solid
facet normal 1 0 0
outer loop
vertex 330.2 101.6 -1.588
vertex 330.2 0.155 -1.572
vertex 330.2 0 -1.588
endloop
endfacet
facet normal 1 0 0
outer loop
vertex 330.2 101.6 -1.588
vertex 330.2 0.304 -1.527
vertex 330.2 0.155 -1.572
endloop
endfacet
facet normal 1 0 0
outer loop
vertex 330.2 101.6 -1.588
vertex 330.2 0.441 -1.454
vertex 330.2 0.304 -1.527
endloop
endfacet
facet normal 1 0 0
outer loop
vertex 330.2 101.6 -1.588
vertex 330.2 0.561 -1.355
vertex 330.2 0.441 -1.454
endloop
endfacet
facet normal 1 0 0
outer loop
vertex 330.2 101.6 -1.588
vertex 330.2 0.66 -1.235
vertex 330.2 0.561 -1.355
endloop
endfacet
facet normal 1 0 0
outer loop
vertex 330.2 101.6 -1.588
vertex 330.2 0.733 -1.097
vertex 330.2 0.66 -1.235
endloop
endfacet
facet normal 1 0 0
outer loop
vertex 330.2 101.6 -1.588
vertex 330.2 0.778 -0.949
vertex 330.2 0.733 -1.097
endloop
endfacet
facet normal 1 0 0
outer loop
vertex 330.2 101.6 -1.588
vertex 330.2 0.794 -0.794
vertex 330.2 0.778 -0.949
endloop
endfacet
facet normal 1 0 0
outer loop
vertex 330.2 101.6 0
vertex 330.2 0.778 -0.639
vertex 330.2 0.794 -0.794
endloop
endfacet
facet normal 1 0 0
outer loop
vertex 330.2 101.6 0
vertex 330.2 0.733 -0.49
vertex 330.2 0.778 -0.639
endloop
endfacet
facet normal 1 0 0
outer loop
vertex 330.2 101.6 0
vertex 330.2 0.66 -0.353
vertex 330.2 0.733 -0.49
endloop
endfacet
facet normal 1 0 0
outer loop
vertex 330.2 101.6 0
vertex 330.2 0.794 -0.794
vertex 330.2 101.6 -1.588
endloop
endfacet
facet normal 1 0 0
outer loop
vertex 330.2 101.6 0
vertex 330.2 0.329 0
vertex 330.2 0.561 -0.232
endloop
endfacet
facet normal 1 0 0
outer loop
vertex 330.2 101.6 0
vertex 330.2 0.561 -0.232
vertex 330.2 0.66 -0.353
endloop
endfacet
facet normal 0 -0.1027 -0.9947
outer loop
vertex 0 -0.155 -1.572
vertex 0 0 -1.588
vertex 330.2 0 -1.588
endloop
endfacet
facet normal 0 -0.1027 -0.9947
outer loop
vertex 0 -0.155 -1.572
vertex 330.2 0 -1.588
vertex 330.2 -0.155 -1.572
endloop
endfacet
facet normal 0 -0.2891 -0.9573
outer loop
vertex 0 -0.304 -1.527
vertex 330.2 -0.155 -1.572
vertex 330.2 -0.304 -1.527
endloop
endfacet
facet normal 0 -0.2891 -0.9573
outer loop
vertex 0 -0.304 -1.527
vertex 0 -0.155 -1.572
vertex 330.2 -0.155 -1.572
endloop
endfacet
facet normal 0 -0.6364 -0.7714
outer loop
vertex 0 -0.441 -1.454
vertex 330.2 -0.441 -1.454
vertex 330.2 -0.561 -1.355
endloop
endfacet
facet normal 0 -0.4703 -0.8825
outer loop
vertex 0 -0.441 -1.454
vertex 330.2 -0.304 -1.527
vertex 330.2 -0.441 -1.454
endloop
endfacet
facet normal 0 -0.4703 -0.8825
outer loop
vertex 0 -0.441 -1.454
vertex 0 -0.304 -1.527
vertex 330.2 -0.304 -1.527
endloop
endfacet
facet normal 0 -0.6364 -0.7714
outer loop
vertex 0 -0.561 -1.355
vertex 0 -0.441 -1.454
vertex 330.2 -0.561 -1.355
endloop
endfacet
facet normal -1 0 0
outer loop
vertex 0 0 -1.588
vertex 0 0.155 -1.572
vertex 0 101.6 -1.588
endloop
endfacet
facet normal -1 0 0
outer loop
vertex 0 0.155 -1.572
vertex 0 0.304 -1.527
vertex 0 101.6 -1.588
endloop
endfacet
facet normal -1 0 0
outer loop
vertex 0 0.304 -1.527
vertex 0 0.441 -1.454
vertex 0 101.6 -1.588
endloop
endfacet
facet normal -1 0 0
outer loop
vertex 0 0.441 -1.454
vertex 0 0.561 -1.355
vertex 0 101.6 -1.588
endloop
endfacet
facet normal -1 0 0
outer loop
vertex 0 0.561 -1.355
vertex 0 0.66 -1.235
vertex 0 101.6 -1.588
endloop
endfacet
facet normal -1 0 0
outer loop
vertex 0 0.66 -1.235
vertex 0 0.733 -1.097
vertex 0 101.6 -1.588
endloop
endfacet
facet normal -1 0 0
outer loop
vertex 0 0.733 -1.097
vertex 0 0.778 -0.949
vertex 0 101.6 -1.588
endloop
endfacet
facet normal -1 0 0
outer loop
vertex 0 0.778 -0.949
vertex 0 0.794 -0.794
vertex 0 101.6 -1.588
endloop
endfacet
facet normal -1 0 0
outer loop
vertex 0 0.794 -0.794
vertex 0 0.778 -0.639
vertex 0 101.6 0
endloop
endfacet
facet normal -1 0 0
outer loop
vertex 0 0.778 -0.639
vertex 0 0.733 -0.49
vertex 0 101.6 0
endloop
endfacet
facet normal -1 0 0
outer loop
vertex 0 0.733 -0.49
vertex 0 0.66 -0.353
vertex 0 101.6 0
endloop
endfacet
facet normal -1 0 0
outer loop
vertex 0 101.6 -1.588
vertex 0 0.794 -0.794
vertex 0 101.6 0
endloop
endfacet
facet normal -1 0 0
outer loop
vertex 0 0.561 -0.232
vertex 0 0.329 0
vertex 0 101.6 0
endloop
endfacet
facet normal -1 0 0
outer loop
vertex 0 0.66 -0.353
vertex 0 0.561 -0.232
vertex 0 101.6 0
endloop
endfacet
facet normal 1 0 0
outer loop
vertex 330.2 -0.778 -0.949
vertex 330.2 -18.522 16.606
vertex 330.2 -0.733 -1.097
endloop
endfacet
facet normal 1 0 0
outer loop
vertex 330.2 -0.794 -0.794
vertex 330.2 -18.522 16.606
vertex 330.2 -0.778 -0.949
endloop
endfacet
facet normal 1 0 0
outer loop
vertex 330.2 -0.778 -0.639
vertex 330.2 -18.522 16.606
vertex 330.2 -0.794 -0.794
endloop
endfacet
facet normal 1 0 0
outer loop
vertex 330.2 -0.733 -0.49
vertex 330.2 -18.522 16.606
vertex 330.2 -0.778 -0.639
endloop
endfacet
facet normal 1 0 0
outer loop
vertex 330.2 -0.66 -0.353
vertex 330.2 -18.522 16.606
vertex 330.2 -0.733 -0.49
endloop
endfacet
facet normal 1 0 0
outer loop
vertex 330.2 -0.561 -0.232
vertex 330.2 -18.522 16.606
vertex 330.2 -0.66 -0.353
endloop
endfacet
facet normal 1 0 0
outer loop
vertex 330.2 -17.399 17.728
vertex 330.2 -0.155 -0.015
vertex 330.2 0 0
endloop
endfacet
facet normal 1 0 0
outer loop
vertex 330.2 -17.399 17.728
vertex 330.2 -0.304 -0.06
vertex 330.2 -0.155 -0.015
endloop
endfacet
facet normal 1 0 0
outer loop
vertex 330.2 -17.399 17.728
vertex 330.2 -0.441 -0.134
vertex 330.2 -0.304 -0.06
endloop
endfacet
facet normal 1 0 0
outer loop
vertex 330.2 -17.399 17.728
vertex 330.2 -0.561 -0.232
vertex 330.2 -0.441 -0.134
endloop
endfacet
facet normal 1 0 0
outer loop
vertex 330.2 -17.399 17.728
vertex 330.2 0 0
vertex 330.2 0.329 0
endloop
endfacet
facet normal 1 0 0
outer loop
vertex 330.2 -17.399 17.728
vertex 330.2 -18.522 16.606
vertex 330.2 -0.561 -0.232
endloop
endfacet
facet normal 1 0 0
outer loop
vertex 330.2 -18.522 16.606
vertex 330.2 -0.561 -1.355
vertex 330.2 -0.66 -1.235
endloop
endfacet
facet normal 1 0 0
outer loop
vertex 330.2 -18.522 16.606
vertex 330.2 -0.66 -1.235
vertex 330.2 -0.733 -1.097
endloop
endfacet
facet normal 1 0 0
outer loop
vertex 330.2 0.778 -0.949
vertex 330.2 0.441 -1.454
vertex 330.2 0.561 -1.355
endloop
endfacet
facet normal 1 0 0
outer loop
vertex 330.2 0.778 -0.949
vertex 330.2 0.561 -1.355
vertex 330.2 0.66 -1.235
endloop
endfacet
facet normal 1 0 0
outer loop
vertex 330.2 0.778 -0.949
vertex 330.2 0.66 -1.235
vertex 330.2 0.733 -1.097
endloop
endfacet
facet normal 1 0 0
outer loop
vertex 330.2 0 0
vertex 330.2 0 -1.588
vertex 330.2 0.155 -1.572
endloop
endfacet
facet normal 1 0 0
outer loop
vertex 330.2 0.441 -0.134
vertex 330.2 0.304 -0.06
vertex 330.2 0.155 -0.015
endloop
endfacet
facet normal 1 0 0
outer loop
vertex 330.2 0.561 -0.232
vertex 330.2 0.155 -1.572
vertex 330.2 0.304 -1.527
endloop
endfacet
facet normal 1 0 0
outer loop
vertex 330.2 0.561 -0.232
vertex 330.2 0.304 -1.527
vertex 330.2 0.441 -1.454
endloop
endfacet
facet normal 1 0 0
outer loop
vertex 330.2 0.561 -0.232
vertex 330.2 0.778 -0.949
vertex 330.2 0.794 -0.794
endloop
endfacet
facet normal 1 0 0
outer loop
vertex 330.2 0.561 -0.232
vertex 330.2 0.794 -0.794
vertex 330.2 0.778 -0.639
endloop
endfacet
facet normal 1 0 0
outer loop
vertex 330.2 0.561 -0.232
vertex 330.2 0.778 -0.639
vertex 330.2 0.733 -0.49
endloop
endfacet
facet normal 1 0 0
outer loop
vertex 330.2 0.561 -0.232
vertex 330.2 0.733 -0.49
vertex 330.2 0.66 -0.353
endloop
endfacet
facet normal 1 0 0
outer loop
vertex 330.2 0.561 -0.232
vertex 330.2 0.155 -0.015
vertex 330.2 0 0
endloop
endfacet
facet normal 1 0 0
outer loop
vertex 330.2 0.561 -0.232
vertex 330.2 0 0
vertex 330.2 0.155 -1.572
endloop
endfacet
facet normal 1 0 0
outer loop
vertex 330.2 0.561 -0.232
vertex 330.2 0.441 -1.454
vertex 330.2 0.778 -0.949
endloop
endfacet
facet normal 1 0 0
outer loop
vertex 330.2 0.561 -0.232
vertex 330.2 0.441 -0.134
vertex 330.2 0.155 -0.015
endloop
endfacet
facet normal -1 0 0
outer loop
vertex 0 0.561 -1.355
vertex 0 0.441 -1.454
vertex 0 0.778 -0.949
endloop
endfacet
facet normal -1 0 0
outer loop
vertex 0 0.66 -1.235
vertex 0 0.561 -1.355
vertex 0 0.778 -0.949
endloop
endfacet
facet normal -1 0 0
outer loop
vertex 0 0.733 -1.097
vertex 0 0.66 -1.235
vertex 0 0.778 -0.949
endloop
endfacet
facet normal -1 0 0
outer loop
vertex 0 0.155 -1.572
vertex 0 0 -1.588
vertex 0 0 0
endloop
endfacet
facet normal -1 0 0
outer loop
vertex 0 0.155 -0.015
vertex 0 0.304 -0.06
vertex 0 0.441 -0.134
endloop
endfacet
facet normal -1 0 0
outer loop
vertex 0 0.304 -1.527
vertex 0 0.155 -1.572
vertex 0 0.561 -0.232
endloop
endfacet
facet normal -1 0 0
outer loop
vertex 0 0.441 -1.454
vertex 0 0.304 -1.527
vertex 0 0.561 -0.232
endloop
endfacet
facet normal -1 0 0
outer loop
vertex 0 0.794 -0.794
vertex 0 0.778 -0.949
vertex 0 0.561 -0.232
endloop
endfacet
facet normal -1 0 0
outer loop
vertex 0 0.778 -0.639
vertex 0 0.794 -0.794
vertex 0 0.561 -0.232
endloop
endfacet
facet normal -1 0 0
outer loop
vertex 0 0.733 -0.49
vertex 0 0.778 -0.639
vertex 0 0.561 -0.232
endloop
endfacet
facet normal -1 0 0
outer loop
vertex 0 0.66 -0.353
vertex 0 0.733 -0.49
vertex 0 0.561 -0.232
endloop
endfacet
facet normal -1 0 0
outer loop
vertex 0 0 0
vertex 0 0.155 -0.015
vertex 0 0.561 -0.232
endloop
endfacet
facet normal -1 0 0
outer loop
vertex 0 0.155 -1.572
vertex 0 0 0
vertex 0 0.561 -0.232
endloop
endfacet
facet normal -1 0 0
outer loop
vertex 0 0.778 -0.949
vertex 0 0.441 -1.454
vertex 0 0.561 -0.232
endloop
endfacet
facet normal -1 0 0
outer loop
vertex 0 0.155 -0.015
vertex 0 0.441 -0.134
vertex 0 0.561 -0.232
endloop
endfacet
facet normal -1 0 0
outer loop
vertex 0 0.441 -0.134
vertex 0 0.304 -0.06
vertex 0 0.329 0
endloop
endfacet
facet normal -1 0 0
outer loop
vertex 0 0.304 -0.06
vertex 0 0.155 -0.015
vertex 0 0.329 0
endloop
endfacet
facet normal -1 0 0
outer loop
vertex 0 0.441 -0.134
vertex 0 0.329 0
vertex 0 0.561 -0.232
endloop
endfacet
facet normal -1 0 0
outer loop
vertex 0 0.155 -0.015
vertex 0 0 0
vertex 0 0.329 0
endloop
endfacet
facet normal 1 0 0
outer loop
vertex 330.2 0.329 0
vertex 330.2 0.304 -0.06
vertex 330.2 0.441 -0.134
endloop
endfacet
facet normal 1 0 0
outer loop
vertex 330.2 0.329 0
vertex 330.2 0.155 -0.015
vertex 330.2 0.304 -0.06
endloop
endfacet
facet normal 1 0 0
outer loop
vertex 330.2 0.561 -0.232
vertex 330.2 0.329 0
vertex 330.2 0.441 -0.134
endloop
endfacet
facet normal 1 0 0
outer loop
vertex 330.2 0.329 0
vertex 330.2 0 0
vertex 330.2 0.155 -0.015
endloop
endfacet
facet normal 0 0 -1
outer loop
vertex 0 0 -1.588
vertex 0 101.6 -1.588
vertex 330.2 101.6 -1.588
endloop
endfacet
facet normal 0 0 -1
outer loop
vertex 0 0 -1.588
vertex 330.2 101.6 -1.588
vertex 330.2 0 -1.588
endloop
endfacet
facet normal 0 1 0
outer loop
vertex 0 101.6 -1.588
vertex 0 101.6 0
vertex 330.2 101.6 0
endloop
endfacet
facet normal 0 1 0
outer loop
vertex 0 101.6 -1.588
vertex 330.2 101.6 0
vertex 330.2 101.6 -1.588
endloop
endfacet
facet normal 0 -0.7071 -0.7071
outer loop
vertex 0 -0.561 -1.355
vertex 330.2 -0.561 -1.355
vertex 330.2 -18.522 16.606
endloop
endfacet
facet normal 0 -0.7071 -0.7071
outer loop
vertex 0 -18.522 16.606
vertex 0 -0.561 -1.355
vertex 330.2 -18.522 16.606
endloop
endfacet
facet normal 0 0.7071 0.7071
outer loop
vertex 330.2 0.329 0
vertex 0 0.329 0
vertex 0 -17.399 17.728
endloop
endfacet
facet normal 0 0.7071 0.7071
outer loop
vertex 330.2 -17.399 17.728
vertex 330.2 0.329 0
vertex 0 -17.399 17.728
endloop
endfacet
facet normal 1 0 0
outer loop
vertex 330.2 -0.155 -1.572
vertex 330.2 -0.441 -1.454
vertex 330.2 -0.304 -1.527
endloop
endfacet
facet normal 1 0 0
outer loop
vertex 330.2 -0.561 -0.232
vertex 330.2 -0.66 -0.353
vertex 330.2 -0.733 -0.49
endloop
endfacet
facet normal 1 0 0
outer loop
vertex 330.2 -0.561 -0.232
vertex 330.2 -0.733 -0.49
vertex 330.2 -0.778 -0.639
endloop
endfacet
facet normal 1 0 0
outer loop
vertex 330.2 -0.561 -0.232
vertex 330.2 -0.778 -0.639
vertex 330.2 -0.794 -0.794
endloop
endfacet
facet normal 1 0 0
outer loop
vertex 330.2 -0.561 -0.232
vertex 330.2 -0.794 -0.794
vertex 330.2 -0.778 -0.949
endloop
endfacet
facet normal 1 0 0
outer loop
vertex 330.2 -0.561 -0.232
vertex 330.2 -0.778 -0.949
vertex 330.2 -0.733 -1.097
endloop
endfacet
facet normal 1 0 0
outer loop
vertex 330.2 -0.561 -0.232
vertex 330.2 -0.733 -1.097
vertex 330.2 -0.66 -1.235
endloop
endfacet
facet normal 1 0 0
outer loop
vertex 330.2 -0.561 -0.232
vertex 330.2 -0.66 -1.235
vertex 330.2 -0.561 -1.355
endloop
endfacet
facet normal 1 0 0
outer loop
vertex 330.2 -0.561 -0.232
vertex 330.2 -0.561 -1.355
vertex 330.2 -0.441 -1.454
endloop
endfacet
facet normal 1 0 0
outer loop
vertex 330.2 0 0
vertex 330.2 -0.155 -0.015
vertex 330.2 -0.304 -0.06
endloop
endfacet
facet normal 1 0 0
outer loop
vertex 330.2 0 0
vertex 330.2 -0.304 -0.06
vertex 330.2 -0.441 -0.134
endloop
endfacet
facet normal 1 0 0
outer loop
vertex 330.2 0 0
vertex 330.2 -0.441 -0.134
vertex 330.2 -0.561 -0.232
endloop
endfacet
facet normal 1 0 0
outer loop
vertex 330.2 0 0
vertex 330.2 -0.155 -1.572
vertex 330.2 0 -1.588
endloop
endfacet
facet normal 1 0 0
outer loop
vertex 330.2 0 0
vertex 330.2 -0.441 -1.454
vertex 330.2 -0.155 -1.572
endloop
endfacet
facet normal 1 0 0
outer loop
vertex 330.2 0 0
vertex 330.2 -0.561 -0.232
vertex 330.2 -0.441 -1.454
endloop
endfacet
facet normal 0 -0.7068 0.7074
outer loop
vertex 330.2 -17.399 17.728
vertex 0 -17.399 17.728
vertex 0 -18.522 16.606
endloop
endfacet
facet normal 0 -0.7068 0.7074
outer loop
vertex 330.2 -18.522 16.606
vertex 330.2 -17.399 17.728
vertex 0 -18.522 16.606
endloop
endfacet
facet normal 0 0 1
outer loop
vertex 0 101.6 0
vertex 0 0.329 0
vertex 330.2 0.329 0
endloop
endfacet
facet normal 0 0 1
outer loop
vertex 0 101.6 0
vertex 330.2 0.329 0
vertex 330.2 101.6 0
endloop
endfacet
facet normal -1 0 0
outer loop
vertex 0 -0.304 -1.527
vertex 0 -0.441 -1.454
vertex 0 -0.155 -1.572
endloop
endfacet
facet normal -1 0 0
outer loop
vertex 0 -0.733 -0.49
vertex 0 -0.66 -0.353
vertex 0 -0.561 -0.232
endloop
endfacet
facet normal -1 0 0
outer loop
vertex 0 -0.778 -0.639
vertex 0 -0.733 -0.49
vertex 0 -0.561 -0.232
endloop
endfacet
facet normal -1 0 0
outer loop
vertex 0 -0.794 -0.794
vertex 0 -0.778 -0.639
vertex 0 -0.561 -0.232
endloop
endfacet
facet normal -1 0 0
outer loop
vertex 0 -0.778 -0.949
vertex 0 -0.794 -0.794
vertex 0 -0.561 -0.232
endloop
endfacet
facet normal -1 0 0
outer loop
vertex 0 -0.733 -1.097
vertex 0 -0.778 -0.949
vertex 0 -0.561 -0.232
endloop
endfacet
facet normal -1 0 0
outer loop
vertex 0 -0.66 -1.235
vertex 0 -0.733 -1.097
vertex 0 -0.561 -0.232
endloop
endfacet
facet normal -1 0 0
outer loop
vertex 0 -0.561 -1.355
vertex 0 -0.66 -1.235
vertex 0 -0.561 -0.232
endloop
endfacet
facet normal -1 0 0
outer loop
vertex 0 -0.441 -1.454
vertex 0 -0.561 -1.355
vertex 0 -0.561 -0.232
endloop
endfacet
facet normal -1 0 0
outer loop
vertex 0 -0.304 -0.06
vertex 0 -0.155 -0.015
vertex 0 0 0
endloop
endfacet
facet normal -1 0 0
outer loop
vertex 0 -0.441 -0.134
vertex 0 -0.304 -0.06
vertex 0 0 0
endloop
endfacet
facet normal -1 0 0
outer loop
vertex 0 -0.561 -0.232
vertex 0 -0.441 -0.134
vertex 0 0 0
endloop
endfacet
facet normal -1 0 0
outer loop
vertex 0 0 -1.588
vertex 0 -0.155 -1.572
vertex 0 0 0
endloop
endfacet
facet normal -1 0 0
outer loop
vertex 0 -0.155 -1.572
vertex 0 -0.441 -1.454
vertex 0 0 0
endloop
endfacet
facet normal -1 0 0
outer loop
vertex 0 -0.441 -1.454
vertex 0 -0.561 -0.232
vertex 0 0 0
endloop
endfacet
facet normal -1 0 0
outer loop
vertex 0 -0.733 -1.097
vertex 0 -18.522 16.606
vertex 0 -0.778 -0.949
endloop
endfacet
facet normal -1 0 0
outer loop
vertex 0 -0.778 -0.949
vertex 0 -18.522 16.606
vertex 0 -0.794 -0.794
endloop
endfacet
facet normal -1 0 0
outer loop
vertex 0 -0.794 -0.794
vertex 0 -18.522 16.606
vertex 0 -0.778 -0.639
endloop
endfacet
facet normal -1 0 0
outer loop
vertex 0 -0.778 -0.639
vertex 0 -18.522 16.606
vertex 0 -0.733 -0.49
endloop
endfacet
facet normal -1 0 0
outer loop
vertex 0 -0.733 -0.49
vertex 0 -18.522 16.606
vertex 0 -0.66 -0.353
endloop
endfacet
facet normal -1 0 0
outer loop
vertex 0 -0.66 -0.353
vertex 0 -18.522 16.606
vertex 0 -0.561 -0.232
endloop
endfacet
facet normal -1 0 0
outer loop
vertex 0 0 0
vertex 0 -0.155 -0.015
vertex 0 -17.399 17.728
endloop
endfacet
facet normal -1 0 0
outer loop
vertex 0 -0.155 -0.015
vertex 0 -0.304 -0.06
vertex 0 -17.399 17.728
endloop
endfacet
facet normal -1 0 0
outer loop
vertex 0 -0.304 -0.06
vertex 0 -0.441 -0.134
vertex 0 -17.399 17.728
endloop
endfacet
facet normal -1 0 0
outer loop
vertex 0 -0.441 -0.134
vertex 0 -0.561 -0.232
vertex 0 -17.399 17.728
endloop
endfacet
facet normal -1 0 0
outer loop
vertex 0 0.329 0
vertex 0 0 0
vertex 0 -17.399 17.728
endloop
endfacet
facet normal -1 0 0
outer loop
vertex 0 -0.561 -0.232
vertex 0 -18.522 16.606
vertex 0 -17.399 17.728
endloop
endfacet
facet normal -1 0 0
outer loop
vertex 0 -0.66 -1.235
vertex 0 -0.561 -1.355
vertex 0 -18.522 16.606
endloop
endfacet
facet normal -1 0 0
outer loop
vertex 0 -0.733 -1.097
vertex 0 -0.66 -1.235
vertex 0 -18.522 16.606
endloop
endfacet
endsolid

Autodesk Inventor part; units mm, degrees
ref_plane "YZ Plane" through (0, 0, 0) normal (1, 0, 0) x (0, 1, 0)
ref_plane "XZ Plane" through (0, 0, 0) normal (0, 1, 0) x (-1, 0, 0)
ref_plane "XY Plane" through (0, 0, 0) normal (0, 0, 1) x (1, 0, 0)
sketch "Sketch1" plane through (0, 0, 0) normal (1, 0, 0) x (0, 1, 0)
  line L0 (0, 0) -> (101.6, 0)
  line L1 (101.6, 0) -> (101.6, -1.5875)
  line L2 (101.6, -1.5875) -> (0, -1.5875)
  line L3 (0, -1.5875) -> (0, 0)
  circle A0 centre (0, -0.7937) radius 0.7937
  line L4 (0.5613, -0.2325) -> (-17.3992, 17.728)
  line L5 (-0.5613, -1.355) -> (-18.5218, 16.6055)
  line L6 (-17.3992, 17.728) -> (-18.5218, 16.6055)
  point P0 (0.3288, 0)
  dimension "d0" = 101.6
  dimension "d1" = 1.5875
  dimension "d2" = 25.4
  dimension "d3" = 135
  dimension "d4" = 25.4
extrude "Extrusion1" add sketch "Sketch1" along normal blind 330.2
properties part number "Wedge" material "Polycarbonate, Clear"
